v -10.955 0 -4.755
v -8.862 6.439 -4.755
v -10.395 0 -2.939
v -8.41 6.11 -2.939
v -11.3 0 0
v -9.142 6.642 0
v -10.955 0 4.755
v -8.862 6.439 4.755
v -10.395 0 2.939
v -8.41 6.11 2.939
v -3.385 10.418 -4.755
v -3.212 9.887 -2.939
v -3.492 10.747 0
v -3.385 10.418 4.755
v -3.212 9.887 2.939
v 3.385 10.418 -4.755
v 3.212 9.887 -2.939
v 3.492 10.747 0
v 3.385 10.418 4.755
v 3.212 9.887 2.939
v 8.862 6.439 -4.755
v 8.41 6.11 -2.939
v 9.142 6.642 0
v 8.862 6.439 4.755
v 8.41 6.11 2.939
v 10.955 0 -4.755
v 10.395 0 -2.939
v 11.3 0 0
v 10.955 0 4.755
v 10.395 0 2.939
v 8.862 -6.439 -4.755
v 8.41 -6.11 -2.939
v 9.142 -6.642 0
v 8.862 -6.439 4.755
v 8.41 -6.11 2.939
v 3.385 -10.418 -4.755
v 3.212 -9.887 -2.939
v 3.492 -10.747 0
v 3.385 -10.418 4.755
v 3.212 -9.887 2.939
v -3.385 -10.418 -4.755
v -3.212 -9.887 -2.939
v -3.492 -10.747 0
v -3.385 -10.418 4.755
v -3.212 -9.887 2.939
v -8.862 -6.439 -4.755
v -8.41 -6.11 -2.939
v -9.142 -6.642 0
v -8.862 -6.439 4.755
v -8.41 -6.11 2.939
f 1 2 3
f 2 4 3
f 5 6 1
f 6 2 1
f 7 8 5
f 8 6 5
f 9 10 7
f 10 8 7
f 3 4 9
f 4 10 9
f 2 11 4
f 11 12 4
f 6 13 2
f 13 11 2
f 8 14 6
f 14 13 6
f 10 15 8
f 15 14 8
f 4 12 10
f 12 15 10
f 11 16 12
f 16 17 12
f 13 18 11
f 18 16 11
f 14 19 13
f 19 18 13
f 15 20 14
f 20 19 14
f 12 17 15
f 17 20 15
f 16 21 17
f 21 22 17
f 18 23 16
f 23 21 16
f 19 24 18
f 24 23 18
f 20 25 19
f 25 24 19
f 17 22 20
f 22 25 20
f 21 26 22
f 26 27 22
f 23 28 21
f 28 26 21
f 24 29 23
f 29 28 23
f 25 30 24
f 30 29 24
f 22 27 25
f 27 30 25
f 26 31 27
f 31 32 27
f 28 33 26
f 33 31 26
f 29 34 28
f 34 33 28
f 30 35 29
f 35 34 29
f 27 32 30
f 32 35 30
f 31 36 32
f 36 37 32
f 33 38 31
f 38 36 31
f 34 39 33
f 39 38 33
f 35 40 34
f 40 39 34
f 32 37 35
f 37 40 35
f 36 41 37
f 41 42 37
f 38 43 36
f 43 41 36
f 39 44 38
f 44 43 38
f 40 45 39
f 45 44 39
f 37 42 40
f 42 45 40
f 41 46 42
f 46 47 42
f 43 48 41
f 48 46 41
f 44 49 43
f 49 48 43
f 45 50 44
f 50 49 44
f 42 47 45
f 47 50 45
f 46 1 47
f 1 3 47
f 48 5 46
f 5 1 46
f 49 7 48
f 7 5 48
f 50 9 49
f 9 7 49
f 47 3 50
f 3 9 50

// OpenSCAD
$fn1 = 5; // [3: 60]
$fn2 = 10; // [3: 60]

height = 10; // [1: .1 : 50]

id = 20.6 ; // [0 : .1 : 100]
od_delta = 1 ; // [0 : .1 : 20]

function move_it(scalar) = scalar * [1, 0, 0];



sonic_ring( height, id, od_delta);





module sonic_ring( height, inner_diameter, od_delta, a_offset=0 , $fn1 = $fn1, $fn2 = $fn2){
    // r1 = height / 2 / height_ratio;
    r1 = od_delta / 2 ;
    r2 = inner_diameter / 2;
    
    a1 = 360/$fn1;
    a2 = 360/$fn2;
    
    outscribed_ratio = 1 - cos( a1 / 2 ) ;
    inscribed_ratio  = cos( a2 / 2 ) ;

    rotate_extrude( $fn = $fn2 )
    minkowski() {
        scale([ 1, height/2/r1 ])
            translate([r1 + r2 ,0 ,0 ])
            rotate(180 + a1/2 + a_offset)
            circle(r1 , $fn = $fn1);
    }
}
